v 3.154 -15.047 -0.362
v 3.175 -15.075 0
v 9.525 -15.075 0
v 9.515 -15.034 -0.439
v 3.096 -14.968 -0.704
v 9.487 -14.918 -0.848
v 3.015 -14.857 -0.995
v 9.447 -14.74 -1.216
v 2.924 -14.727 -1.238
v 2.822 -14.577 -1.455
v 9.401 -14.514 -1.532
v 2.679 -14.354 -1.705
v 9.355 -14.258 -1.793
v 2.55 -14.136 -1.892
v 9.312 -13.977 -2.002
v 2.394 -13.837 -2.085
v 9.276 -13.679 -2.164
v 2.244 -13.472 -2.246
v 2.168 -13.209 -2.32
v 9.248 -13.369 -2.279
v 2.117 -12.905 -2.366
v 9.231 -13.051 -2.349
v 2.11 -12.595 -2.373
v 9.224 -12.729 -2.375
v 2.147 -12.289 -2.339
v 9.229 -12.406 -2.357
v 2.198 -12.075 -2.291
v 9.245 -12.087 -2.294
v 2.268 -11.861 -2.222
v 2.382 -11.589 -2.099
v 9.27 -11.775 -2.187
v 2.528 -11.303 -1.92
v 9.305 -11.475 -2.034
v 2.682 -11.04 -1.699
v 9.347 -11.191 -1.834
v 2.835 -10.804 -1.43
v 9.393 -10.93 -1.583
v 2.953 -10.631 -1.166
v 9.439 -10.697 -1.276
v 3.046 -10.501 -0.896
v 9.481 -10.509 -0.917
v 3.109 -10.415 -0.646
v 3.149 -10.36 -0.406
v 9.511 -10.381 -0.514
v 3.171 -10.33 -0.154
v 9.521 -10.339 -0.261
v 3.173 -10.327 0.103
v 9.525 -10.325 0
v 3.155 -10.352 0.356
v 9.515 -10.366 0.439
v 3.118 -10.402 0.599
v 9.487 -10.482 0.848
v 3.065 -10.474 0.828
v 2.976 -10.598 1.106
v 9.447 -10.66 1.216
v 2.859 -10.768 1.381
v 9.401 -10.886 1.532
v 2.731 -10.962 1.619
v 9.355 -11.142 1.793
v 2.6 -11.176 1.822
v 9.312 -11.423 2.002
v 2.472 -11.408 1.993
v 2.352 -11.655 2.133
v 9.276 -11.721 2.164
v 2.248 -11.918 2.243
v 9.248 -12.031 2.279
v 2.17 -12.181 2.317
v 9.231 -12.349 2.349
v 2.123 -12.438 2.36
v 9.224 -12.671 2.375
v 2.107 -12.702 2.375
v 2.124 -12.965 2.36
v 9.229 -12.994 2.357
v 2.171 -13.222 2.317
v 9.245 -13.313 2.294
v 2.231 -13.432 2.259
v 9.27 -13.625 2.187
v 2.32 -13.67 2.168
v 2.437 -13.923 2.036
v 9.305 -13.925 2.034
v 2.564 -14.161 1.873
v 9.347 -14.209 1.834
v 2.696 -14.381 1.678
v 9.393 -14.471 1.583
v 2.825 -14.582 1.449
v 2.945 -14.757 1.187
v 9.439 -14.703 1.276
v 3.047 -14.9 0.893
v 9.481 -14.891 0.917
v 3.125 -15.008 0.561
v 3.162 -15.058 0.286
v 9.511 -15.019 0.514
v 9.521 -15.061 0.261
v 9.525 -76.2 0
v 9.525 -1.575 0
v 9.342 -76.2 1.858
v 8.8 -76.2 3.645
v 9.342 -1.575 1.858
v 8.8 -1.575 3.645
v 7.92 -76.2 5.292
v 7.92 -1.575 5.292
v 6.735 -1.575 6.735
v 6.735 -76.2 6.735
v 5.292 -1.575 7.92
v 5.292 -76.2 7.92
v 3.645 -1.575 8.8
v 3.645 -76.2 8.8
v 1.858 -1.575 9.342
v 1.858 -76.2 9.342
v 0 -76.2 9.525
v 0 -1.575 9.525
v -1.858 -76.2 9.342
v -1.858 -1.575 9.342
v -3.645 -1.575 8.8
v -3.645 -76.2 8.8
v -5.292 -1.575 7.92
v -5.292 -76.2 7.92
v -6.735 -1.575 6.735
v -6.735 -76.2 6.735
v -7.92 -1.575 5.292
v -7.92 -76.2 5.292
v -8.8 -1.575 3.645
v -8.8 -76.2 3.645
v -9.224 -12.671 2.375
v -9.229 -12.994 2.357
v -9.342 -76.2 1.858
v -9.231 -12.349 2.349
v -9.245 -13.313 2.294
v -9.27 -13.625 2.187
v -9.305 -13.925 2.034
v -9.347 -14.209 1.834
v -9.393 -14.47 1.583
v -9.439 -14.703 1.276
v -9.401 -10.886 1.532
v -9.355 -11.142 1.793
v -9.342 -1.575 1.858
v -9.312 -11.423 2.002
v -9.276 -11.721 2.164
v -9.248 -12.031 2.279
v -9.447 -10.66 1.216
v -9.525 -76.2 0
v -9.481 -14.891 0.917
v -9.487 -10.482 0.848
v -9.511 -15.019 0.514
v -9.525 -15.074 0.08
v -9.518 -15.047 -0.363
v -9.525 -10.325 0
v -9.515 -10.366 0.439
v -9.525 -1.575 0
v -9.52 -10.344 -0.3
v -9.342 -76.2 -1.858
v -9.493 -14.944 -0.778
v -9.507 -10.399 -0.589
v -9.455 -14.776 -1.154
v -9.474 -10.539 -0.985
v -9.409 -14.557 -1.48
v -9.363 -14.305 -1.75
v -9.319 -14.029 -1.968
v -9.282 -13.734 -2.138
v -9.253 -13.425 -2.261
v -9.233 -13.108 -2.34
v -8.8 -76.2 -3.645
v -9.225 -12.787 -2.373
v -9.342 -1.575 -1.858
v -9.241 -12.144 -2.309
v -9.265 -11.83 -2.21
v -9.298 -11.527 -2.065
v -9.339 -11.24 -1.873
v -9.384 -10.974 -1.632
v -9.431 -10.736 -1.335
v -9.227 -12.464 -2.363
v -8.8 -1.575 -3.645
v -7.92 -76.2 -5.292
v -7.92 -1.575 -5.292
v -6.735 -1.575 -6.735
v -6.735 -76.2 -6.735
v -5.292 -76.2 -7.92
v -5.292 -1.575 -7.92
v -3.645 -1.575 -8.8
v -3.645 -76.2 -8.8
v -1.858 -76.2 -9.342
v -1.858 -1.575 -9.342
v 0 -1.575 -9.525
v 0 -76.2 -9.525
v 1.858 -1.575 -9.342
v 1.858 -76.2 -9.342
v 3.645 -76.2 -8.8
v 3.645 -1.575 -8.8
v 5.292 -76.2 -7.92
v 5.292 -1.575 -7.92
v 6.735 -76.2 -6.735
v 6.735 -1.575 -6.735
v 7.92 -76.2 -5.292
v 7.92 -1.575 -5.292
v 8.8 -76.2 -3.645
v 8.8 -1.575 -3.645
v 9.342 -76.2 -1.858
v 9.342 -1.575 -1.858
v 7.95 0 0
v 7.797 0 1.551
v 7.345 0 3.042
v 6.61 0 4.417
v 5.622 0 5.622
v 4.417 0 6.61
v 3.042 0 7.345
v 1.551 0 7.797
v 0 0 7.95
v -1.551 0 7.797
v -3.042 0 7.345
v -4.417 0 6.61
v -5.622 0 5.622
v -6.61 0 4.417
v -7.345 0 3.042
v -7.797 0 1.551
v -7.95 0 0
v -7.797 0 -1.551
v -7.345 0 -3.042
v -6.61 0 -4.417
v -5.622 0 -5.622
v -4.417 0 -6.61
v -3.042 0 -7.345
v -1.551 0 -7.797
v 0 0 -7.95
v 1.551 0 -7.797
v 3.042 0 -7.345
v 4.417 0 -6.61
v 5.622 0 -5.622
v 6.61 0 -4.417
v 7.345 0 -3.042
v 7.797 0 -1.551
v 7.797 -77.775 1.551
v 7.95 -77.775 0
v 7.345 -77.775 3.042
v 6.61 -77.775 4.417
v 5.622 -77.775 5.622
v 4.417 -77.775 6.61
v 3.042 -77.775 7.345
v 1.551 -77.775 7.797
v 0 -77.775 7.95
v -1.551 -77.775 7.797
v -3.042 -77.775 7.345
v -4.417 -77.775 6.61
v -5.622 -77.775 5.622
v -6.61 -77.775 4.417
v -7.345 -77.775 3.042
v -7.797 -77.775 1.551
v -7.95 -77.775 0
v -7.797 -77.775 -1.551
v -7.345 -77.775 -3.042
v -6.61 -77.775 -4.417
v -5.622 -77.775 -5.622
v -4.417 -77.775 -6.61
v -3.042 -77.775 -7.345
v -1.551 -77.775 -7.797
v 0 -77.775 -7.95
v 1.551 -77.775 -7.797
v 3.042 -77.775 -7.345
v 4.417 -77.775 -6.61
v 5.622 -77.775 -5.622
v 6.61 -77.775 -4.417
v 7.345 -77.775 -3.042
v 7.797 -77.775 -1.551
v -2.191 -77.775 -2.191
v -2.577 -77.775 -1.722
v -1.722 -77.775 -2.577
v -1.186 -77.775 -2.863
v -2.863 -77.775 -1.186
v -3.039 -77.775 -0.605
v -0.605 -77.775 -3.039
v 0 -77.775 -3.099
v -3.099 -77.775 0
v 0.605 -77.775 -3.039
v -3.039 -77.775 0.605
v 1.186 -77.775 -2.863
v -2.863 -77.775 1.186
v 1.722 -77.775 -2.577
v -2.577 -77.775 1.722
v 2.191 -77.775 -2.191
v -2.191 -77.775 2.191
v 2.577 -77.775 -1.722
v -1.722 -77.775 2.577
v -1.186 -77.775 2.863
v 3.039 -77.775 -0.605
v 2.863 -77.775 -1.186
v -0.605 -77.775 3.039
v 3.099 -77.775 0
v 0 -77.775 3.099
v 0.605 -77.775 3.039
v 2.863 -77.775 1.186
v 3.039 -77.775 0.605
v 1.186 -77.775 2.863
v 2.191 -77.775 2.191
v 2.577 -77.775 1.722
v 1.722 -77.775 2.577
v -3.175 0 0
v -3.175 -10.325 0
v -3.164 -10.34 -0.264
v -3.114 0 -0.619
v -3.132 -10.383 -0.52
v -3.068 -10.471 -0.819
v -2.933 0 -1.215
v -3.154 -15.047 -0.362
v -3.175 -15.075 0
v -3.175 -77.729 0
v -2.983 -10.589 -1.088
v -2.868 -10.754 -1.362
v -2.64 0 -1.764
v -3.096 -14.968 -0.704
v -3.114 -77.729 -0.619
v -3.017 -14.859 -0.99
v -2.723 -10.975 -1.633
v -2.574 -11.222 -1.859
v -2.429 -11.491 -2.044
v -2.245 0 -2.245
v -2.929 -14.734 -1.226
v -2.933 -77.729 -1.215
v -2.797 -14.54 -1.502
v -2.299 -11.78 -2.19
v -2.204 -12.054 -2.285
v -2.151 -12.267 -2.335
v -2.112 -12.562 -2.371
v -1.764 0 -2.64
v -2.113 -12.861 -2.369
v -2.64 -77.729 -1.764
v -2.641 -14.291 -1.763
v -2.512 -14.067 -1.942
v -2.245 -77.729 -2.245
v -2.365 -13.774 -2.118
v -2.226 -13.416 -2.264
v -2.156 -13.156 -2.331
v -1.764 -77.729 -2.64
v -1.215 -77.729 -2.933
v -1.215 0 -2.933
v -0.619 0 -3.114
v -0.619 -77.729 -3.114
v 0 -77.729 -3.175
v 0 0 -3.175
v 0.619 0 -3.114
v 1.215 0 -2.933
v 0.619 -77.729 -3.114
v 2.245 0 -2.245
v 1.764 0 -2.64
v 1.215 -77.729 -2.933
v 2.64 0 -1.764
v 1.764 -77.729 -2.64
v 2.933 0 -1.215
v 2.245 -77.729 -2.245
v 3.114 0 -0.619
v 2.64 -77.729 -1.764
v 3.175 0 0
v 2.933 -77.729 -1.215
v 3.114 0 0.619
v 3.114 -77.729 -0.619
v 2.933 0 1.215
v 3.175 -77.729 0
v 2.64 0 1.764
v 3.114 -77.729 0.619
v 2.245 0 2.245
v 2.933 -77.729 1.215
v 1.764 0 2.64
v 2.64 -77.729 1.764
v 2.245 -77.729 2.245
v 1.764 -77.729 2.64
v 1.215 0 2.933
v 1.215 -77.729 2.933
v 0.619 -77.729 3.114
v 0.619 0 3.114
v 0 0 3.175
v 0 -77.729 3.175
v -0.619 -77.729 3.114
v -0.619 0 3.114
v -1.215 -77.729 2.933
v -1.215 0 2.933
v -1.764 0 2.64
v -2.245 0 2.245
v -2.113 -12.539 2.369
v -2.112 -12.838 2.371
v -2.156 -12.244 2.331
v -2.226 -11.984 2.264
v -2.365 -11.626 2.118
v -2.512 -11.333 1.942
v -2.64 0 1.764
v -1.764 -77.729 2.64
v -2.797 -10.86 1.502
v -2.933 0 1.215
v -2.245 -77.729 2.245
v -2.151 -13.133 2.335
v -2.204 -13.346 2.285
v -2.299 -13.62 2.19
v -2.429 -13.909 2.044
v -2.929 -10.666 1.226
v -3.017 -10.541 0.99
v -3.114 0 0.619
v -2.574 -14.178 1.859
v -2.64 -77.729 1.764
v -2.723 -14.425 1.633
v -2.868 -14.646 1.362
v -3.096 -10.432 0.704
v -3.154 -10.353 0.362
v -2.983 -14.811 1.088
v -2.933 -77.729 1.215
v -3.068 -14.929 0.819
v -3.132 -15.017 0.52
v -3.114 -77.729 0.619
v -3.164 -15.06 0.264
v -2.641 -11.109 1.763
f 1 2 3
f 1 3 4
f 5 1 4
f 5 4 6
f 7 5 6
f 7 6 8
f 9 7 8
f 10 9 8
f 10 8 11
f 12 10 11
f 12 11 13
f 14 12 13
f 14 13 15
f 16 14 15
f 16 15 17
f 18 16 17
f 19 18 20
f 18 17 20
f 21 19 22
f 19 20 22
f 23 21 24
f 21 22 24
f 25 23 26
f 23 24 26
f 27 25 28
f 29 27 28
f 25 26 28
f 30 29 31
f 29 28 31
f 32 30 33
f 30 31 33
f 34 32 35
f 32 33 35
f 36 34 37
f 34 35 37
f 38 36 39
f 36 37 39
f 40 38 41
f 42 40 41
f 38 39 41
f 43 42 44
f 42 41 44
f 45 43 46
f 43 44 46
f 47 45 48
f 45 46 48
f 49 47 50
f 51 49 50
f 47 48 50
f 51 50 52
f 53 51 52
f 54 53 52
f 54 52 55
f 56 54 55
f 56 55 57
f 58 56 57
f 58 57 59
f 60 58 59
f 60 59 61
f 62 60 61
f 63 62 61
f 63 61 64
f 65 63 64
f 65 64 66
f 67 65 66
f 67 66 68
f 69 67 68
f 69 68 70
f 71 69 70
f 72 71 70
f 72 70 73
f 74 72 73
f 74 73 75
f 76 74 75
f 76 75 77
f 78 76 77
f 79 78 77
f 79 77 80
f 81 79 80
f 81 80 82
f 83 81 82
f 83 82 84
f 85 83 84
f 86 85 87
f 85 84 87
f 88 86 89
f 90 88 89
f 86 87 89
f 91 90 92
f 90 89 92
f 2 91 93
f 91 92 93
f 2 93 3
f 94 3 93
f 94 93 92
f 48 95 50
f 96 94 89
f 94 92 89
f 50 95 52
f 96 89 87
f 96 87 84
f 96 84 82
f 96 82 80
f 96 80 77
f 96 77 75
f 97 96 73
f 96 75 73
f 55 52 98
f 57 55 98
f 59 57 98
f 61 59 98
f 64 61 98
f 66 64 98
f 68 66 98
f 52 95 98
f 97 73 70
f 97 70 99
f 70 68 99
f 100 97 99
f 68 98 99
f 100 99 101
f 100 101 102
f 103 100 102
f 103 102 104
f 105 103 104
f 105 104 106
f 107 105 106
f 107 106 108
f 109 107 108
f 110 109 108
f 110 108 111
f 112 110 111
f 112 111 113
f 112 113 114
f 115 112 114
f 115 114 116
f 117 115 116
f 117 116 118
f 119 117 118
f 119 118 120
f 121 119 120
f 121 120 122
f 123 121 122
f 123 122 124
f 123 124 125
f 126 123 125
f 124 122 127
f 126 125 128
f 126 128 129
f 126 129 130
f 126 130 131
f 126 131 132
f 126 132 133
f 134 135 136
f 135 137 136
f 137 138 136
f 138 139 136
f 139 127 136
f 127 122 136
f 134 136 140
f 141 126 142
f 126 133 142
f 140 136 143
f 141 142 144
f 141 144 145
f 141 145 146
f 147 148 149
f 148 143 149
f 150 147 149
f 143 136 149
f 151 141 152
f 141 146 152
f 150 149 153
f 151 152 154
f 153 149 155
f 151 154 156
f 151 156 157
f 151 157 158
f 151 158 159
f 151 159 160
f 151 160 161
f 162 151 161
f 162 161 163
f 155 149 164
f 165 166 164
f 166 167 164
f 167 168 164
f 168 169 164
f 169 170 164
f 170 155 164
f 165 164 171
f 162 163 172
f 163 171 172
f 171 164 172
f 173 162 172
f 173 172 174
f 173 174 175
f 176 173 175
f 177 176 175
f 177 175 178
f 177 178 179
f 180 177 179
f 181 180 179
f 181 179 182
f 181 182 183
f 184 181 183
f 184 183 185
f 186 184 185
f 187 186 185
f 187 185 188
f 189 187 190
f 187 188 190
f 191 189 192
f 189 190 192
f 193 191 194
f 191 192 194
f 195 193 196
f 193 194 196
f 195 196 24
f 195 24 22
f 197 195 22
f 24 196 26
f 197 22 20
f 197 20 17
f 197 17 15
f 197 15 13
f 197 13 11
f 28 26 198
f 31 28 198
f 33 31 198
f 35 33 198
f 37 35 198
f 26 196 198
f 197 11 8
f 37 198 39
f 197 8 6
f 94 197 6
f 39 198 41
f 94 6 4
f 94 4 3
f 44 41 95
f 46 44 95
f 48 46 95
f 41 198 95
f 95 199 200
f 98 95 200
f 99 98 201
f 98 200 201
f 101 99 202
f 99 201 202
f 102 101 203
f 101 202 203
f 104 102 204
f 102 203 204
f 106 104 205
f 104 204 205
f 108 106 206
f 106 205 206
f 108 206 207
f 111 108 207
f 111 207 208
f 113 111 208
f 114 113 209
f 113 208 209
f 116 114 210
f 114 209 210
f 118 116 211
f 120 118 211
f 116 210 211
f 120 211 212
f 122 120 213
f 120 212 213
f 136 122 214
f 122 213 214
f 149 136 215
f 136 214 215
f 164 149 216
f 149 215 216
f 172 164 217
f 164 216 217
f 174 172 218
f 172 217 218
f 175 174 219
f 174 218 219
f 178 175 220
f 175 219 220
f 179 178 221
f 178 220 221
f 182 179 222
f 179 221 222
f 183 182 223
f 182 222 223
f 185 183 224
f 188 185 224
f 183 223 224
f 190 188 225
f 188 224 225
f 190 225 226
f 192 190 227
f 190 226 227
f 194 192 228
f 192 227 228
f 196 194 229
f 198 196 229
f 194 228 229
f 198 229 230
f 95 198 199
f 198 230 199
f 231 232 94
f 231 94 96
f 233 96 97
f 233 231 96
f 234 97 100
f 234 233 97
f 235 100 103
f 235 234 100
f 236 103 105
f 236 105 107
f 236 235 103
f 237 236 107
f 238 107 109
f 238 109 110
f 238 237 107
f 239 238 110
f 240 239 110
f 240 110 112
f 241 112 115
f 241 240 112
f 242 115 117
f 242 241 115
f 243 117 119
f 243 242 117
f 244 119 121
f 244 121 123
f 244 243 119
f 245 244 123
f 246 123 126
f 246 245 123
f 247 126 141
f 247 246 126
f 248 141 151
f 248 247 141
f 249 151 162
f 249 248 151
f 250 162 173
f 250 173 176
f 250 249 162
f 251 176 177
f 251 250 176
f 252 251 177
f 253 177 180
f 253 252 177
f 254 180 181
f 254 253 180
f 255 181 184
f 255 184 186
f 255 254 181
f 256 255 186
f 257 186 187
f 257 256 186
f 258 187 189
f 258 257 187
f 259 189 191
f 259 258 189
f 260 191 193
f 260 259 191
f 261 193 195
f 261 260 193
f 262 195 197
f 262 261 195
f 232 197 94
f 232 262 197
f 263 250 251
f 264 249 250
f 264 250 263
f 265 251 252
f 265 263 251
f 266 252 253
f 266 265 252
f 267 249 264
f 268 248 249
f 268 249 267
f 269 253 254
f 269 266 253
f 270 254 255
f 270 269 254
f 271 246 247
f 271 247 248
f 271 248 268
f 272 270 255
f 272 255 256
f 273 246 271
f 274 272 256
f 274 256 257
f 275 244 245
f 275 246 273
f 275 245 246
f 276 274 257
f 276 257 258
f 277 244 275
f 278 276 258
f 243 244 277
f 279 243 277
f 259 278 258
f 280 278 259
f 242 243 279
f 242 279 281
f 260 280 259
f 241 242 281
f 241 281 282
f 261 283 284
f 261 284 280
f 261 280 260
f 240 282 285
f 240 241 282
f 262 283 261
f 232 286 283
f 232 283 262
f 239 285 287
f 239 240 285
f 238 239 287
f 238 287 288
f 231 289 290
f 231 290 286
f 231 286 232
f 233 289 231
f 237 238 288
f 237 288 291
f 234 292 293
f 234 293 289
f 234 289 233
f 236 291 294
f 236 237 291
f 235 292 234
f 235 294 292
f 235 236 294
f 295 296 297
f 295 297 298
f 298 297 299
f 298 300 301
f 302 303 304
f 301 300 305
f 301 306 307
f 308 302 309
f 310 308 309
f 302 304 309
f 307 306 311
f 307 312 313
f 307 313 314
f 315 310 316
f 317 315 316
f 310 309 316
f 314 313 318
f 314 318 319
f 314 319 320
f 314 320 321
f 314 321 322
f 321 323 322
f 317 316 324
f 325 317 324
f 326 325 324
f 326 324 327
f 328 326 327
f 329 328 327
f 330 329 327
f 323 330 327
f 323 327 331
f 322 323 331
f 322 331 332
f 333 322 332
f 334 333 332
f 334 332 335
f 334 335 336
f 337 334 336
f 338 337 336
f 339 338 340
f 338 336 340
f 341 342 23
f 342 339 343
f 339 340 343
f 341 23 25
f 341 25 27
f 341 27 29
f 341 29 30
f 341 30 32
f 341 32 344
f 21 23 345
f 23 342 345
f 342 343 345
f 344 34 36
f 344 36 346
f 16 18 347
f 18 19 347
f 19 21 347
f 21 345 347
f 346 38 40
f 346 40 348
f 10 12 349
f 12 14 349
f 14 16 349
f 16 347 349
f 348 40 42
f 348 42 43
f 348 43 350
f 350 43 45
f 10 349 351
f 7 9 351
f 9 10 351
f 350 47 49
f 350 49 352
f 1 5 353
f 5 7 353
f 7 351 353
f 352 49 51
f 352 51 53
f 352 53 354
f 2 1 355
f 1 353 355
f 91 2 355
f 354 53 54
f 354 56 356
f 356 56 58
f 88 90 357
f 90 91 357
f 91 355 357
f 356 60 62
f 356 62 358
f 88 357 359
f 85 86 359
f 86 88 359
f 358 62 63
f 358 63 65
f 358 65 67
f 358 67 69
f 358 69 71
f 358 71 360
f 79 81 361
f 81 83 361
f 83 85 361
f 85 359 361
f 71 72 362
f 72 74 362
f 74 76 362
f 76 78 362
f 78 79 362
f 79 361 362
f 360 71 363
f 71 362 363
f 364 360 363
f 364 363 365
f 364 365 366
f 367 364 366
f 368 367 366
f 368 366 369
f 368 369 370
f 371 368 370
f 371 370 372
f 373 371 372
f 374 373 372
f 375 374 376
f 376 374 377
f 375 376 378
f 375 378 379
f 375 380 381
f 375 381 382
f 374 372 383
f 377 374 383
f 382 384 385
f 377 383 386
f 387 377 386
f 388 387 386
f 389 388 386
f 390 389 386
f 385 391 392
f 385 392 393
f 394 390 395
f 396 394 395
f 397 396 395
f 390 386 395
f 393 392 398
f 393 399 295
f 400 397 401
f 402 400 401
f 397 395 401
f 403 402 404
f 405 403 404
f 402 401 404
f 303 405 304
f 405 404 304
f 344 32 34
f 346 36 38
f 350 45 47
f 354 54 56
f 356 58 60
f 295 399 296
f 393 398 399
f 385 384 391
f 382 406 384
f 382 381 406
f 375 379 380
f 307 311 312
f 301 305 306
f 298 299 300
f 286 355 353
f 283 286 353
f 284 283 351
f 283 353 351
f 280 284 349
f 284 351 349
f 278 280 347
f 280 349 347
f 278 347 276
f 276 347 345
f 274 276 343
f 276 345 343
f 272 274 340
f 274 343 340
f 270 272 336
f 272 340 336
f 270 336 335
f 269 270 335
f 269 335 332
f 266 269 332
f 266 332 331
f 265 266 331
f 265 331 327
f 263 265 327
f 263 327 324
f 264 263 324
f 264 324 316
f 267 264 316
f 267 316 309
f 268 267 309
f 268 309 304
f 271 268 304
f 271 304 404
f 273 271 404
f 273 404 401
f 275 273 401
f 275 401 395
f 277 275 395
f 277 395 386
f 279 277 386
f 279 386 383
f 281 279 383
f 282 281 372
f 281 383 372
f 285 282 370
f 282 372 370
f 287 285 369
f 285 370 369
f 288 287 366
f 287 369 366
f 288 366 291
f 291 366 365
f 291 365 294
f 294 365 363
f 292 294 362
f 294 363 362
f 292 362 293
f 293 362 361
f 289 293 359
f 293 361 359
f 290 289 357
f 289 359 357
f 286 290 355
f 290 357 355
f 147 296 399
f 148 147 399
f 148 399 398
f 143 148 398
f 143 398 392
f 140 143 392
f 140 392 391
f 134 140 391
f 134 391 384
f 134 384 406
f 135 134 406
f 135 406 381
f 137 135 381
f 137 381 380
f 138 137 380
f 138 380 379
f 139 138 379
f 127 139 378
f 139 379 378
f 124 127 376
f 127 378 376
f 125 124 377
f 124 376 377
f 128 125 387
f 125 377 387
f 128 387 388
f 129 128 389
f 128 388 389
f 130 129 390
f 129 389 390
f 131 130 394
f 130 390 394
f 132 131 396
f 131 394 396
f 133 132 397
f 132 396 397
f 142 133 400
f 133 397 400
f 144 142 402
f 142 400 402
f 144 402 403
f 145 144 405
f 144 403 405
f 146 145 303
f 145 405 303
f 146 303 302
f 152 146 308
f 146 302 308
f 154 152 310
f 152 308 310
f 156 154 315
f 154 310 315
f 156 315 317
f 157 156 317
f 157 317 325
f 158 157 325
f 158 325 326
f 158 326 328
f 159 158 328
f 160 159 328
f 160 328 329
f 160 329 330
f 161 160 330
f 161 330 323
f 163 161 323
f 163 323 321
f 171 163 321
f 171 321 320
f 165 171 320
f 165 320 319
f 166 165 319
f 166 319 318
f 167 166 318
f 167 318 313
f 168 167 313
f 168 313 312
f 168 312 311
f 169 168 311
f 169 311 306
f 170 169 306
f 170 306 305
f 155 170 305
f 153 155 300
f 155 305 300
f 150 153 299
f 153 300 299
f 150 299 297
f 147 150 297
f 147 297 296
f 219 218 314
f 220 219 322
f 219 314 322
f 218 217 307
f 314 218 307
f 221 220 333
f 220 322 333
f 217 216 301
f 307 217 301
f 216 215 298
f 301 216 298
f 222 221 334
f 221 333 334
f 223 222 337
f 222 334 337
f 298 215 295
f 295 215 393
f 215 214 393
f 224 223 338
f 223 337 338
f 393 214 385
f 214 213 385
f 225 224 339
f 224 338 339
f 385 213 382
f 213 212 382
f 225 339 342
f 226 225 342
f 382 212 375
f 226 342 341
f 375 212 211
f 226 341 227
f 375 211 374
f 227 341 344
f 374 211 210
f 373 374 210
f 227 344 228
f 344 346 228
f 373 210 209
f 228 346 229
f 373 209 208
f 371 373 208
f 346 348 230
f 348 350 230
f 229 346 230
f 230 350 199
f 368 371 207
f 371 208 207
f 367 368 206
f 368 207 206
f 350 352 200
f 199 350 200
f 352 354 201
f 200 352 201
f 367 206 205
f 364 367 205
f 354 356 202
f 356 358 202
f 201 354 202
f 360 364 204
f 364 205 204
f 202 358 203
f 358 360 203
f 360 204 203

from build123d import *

# Parameters (mm, degrees)
F0_R     = 9.525
F1_DEPTH = 77.7748
F3_D     = 6.35
F3_DEPTH = 77.72908
F3_TIP   = 1.9077324654
F4_SIZE2 = 1.5748
F4_SIZE  = 1.5748
F6_D     = 4.7498
F6_DEPTH = 19.05
F6_TIP   = 1.4269838841
F8_D     = 4.7498
F8_DEPTH = 19.05
F8_START = 3.1750001
F8_TIP   = 1.4269838841


with BuildPart() as f1:
    # F0 (on Front) → F1 (new body)
    with BuildSketch(Plane.XZ):
        Circle(F0_R)
    extrude(amount=F1_DEPTH)

    # F3
    with Locations(Plane(origin=(0, 0, 0), x_dir=(1, 0, 0), z_dir=(0, 1, 0))):
        with Locations((0, 0)):
            Hole(F3_D / 2, depth=F3_DEPTH)
            with Locations((0, 0, -(F3_DEPTH + F3_TIP / 2))):  # 118° drill point
                Cone(0, F3_D / 2, F3_TIP, mode=Mode.SUBTRACT)

    # F4
    f4_edges = [f1.edges().sort_by_distance(p)[0] for p in [
        (-9.525, -77.7748, 0),
        (-9.525, 0, 0),
    ]]
    chamfer(f4_edges, length=F4_SIZE, length2=F4_SIZE2)

    # F6 (one way)
    with BuildSketch(Plane.YZ):
        with Locations((-12.7, 0)):
            Circle(F6_D / 2)
    extrude(amount=-F6_DEPTH, mode=Mode.SUBTRACT)
    with Locations(Plane.YZ):
        with Locations((-12.7, 0)):
            with Locations((0, 0, -(F6_DEPTH + F6_TIP / 2))):  # 118° drill point
                Cone(0, F6_D / 2, F6_TIP, mode=Mode.SUBTRACT)

    # F8
    # its depths count from where the whole tool has entered the part; down to there all is cleared
    with Locations(Plane(origin=(0, 0, 0), x_dir=(0, 1, 0), z_dir=(-1, 0, 0)).offset(-F8_START)):
        with Locations((-12.7, 0)):
            Hole(F8_D / 2, depth=F8_DEPTH)
            with Locations((0, 0, -(F8_DEPTH + F8_TIP / 2))):  # 118° drill point
                Cone(0, F8_D / 2, F8_TIP, mode=Mode.SUBTRACT)


solid = f1.part
